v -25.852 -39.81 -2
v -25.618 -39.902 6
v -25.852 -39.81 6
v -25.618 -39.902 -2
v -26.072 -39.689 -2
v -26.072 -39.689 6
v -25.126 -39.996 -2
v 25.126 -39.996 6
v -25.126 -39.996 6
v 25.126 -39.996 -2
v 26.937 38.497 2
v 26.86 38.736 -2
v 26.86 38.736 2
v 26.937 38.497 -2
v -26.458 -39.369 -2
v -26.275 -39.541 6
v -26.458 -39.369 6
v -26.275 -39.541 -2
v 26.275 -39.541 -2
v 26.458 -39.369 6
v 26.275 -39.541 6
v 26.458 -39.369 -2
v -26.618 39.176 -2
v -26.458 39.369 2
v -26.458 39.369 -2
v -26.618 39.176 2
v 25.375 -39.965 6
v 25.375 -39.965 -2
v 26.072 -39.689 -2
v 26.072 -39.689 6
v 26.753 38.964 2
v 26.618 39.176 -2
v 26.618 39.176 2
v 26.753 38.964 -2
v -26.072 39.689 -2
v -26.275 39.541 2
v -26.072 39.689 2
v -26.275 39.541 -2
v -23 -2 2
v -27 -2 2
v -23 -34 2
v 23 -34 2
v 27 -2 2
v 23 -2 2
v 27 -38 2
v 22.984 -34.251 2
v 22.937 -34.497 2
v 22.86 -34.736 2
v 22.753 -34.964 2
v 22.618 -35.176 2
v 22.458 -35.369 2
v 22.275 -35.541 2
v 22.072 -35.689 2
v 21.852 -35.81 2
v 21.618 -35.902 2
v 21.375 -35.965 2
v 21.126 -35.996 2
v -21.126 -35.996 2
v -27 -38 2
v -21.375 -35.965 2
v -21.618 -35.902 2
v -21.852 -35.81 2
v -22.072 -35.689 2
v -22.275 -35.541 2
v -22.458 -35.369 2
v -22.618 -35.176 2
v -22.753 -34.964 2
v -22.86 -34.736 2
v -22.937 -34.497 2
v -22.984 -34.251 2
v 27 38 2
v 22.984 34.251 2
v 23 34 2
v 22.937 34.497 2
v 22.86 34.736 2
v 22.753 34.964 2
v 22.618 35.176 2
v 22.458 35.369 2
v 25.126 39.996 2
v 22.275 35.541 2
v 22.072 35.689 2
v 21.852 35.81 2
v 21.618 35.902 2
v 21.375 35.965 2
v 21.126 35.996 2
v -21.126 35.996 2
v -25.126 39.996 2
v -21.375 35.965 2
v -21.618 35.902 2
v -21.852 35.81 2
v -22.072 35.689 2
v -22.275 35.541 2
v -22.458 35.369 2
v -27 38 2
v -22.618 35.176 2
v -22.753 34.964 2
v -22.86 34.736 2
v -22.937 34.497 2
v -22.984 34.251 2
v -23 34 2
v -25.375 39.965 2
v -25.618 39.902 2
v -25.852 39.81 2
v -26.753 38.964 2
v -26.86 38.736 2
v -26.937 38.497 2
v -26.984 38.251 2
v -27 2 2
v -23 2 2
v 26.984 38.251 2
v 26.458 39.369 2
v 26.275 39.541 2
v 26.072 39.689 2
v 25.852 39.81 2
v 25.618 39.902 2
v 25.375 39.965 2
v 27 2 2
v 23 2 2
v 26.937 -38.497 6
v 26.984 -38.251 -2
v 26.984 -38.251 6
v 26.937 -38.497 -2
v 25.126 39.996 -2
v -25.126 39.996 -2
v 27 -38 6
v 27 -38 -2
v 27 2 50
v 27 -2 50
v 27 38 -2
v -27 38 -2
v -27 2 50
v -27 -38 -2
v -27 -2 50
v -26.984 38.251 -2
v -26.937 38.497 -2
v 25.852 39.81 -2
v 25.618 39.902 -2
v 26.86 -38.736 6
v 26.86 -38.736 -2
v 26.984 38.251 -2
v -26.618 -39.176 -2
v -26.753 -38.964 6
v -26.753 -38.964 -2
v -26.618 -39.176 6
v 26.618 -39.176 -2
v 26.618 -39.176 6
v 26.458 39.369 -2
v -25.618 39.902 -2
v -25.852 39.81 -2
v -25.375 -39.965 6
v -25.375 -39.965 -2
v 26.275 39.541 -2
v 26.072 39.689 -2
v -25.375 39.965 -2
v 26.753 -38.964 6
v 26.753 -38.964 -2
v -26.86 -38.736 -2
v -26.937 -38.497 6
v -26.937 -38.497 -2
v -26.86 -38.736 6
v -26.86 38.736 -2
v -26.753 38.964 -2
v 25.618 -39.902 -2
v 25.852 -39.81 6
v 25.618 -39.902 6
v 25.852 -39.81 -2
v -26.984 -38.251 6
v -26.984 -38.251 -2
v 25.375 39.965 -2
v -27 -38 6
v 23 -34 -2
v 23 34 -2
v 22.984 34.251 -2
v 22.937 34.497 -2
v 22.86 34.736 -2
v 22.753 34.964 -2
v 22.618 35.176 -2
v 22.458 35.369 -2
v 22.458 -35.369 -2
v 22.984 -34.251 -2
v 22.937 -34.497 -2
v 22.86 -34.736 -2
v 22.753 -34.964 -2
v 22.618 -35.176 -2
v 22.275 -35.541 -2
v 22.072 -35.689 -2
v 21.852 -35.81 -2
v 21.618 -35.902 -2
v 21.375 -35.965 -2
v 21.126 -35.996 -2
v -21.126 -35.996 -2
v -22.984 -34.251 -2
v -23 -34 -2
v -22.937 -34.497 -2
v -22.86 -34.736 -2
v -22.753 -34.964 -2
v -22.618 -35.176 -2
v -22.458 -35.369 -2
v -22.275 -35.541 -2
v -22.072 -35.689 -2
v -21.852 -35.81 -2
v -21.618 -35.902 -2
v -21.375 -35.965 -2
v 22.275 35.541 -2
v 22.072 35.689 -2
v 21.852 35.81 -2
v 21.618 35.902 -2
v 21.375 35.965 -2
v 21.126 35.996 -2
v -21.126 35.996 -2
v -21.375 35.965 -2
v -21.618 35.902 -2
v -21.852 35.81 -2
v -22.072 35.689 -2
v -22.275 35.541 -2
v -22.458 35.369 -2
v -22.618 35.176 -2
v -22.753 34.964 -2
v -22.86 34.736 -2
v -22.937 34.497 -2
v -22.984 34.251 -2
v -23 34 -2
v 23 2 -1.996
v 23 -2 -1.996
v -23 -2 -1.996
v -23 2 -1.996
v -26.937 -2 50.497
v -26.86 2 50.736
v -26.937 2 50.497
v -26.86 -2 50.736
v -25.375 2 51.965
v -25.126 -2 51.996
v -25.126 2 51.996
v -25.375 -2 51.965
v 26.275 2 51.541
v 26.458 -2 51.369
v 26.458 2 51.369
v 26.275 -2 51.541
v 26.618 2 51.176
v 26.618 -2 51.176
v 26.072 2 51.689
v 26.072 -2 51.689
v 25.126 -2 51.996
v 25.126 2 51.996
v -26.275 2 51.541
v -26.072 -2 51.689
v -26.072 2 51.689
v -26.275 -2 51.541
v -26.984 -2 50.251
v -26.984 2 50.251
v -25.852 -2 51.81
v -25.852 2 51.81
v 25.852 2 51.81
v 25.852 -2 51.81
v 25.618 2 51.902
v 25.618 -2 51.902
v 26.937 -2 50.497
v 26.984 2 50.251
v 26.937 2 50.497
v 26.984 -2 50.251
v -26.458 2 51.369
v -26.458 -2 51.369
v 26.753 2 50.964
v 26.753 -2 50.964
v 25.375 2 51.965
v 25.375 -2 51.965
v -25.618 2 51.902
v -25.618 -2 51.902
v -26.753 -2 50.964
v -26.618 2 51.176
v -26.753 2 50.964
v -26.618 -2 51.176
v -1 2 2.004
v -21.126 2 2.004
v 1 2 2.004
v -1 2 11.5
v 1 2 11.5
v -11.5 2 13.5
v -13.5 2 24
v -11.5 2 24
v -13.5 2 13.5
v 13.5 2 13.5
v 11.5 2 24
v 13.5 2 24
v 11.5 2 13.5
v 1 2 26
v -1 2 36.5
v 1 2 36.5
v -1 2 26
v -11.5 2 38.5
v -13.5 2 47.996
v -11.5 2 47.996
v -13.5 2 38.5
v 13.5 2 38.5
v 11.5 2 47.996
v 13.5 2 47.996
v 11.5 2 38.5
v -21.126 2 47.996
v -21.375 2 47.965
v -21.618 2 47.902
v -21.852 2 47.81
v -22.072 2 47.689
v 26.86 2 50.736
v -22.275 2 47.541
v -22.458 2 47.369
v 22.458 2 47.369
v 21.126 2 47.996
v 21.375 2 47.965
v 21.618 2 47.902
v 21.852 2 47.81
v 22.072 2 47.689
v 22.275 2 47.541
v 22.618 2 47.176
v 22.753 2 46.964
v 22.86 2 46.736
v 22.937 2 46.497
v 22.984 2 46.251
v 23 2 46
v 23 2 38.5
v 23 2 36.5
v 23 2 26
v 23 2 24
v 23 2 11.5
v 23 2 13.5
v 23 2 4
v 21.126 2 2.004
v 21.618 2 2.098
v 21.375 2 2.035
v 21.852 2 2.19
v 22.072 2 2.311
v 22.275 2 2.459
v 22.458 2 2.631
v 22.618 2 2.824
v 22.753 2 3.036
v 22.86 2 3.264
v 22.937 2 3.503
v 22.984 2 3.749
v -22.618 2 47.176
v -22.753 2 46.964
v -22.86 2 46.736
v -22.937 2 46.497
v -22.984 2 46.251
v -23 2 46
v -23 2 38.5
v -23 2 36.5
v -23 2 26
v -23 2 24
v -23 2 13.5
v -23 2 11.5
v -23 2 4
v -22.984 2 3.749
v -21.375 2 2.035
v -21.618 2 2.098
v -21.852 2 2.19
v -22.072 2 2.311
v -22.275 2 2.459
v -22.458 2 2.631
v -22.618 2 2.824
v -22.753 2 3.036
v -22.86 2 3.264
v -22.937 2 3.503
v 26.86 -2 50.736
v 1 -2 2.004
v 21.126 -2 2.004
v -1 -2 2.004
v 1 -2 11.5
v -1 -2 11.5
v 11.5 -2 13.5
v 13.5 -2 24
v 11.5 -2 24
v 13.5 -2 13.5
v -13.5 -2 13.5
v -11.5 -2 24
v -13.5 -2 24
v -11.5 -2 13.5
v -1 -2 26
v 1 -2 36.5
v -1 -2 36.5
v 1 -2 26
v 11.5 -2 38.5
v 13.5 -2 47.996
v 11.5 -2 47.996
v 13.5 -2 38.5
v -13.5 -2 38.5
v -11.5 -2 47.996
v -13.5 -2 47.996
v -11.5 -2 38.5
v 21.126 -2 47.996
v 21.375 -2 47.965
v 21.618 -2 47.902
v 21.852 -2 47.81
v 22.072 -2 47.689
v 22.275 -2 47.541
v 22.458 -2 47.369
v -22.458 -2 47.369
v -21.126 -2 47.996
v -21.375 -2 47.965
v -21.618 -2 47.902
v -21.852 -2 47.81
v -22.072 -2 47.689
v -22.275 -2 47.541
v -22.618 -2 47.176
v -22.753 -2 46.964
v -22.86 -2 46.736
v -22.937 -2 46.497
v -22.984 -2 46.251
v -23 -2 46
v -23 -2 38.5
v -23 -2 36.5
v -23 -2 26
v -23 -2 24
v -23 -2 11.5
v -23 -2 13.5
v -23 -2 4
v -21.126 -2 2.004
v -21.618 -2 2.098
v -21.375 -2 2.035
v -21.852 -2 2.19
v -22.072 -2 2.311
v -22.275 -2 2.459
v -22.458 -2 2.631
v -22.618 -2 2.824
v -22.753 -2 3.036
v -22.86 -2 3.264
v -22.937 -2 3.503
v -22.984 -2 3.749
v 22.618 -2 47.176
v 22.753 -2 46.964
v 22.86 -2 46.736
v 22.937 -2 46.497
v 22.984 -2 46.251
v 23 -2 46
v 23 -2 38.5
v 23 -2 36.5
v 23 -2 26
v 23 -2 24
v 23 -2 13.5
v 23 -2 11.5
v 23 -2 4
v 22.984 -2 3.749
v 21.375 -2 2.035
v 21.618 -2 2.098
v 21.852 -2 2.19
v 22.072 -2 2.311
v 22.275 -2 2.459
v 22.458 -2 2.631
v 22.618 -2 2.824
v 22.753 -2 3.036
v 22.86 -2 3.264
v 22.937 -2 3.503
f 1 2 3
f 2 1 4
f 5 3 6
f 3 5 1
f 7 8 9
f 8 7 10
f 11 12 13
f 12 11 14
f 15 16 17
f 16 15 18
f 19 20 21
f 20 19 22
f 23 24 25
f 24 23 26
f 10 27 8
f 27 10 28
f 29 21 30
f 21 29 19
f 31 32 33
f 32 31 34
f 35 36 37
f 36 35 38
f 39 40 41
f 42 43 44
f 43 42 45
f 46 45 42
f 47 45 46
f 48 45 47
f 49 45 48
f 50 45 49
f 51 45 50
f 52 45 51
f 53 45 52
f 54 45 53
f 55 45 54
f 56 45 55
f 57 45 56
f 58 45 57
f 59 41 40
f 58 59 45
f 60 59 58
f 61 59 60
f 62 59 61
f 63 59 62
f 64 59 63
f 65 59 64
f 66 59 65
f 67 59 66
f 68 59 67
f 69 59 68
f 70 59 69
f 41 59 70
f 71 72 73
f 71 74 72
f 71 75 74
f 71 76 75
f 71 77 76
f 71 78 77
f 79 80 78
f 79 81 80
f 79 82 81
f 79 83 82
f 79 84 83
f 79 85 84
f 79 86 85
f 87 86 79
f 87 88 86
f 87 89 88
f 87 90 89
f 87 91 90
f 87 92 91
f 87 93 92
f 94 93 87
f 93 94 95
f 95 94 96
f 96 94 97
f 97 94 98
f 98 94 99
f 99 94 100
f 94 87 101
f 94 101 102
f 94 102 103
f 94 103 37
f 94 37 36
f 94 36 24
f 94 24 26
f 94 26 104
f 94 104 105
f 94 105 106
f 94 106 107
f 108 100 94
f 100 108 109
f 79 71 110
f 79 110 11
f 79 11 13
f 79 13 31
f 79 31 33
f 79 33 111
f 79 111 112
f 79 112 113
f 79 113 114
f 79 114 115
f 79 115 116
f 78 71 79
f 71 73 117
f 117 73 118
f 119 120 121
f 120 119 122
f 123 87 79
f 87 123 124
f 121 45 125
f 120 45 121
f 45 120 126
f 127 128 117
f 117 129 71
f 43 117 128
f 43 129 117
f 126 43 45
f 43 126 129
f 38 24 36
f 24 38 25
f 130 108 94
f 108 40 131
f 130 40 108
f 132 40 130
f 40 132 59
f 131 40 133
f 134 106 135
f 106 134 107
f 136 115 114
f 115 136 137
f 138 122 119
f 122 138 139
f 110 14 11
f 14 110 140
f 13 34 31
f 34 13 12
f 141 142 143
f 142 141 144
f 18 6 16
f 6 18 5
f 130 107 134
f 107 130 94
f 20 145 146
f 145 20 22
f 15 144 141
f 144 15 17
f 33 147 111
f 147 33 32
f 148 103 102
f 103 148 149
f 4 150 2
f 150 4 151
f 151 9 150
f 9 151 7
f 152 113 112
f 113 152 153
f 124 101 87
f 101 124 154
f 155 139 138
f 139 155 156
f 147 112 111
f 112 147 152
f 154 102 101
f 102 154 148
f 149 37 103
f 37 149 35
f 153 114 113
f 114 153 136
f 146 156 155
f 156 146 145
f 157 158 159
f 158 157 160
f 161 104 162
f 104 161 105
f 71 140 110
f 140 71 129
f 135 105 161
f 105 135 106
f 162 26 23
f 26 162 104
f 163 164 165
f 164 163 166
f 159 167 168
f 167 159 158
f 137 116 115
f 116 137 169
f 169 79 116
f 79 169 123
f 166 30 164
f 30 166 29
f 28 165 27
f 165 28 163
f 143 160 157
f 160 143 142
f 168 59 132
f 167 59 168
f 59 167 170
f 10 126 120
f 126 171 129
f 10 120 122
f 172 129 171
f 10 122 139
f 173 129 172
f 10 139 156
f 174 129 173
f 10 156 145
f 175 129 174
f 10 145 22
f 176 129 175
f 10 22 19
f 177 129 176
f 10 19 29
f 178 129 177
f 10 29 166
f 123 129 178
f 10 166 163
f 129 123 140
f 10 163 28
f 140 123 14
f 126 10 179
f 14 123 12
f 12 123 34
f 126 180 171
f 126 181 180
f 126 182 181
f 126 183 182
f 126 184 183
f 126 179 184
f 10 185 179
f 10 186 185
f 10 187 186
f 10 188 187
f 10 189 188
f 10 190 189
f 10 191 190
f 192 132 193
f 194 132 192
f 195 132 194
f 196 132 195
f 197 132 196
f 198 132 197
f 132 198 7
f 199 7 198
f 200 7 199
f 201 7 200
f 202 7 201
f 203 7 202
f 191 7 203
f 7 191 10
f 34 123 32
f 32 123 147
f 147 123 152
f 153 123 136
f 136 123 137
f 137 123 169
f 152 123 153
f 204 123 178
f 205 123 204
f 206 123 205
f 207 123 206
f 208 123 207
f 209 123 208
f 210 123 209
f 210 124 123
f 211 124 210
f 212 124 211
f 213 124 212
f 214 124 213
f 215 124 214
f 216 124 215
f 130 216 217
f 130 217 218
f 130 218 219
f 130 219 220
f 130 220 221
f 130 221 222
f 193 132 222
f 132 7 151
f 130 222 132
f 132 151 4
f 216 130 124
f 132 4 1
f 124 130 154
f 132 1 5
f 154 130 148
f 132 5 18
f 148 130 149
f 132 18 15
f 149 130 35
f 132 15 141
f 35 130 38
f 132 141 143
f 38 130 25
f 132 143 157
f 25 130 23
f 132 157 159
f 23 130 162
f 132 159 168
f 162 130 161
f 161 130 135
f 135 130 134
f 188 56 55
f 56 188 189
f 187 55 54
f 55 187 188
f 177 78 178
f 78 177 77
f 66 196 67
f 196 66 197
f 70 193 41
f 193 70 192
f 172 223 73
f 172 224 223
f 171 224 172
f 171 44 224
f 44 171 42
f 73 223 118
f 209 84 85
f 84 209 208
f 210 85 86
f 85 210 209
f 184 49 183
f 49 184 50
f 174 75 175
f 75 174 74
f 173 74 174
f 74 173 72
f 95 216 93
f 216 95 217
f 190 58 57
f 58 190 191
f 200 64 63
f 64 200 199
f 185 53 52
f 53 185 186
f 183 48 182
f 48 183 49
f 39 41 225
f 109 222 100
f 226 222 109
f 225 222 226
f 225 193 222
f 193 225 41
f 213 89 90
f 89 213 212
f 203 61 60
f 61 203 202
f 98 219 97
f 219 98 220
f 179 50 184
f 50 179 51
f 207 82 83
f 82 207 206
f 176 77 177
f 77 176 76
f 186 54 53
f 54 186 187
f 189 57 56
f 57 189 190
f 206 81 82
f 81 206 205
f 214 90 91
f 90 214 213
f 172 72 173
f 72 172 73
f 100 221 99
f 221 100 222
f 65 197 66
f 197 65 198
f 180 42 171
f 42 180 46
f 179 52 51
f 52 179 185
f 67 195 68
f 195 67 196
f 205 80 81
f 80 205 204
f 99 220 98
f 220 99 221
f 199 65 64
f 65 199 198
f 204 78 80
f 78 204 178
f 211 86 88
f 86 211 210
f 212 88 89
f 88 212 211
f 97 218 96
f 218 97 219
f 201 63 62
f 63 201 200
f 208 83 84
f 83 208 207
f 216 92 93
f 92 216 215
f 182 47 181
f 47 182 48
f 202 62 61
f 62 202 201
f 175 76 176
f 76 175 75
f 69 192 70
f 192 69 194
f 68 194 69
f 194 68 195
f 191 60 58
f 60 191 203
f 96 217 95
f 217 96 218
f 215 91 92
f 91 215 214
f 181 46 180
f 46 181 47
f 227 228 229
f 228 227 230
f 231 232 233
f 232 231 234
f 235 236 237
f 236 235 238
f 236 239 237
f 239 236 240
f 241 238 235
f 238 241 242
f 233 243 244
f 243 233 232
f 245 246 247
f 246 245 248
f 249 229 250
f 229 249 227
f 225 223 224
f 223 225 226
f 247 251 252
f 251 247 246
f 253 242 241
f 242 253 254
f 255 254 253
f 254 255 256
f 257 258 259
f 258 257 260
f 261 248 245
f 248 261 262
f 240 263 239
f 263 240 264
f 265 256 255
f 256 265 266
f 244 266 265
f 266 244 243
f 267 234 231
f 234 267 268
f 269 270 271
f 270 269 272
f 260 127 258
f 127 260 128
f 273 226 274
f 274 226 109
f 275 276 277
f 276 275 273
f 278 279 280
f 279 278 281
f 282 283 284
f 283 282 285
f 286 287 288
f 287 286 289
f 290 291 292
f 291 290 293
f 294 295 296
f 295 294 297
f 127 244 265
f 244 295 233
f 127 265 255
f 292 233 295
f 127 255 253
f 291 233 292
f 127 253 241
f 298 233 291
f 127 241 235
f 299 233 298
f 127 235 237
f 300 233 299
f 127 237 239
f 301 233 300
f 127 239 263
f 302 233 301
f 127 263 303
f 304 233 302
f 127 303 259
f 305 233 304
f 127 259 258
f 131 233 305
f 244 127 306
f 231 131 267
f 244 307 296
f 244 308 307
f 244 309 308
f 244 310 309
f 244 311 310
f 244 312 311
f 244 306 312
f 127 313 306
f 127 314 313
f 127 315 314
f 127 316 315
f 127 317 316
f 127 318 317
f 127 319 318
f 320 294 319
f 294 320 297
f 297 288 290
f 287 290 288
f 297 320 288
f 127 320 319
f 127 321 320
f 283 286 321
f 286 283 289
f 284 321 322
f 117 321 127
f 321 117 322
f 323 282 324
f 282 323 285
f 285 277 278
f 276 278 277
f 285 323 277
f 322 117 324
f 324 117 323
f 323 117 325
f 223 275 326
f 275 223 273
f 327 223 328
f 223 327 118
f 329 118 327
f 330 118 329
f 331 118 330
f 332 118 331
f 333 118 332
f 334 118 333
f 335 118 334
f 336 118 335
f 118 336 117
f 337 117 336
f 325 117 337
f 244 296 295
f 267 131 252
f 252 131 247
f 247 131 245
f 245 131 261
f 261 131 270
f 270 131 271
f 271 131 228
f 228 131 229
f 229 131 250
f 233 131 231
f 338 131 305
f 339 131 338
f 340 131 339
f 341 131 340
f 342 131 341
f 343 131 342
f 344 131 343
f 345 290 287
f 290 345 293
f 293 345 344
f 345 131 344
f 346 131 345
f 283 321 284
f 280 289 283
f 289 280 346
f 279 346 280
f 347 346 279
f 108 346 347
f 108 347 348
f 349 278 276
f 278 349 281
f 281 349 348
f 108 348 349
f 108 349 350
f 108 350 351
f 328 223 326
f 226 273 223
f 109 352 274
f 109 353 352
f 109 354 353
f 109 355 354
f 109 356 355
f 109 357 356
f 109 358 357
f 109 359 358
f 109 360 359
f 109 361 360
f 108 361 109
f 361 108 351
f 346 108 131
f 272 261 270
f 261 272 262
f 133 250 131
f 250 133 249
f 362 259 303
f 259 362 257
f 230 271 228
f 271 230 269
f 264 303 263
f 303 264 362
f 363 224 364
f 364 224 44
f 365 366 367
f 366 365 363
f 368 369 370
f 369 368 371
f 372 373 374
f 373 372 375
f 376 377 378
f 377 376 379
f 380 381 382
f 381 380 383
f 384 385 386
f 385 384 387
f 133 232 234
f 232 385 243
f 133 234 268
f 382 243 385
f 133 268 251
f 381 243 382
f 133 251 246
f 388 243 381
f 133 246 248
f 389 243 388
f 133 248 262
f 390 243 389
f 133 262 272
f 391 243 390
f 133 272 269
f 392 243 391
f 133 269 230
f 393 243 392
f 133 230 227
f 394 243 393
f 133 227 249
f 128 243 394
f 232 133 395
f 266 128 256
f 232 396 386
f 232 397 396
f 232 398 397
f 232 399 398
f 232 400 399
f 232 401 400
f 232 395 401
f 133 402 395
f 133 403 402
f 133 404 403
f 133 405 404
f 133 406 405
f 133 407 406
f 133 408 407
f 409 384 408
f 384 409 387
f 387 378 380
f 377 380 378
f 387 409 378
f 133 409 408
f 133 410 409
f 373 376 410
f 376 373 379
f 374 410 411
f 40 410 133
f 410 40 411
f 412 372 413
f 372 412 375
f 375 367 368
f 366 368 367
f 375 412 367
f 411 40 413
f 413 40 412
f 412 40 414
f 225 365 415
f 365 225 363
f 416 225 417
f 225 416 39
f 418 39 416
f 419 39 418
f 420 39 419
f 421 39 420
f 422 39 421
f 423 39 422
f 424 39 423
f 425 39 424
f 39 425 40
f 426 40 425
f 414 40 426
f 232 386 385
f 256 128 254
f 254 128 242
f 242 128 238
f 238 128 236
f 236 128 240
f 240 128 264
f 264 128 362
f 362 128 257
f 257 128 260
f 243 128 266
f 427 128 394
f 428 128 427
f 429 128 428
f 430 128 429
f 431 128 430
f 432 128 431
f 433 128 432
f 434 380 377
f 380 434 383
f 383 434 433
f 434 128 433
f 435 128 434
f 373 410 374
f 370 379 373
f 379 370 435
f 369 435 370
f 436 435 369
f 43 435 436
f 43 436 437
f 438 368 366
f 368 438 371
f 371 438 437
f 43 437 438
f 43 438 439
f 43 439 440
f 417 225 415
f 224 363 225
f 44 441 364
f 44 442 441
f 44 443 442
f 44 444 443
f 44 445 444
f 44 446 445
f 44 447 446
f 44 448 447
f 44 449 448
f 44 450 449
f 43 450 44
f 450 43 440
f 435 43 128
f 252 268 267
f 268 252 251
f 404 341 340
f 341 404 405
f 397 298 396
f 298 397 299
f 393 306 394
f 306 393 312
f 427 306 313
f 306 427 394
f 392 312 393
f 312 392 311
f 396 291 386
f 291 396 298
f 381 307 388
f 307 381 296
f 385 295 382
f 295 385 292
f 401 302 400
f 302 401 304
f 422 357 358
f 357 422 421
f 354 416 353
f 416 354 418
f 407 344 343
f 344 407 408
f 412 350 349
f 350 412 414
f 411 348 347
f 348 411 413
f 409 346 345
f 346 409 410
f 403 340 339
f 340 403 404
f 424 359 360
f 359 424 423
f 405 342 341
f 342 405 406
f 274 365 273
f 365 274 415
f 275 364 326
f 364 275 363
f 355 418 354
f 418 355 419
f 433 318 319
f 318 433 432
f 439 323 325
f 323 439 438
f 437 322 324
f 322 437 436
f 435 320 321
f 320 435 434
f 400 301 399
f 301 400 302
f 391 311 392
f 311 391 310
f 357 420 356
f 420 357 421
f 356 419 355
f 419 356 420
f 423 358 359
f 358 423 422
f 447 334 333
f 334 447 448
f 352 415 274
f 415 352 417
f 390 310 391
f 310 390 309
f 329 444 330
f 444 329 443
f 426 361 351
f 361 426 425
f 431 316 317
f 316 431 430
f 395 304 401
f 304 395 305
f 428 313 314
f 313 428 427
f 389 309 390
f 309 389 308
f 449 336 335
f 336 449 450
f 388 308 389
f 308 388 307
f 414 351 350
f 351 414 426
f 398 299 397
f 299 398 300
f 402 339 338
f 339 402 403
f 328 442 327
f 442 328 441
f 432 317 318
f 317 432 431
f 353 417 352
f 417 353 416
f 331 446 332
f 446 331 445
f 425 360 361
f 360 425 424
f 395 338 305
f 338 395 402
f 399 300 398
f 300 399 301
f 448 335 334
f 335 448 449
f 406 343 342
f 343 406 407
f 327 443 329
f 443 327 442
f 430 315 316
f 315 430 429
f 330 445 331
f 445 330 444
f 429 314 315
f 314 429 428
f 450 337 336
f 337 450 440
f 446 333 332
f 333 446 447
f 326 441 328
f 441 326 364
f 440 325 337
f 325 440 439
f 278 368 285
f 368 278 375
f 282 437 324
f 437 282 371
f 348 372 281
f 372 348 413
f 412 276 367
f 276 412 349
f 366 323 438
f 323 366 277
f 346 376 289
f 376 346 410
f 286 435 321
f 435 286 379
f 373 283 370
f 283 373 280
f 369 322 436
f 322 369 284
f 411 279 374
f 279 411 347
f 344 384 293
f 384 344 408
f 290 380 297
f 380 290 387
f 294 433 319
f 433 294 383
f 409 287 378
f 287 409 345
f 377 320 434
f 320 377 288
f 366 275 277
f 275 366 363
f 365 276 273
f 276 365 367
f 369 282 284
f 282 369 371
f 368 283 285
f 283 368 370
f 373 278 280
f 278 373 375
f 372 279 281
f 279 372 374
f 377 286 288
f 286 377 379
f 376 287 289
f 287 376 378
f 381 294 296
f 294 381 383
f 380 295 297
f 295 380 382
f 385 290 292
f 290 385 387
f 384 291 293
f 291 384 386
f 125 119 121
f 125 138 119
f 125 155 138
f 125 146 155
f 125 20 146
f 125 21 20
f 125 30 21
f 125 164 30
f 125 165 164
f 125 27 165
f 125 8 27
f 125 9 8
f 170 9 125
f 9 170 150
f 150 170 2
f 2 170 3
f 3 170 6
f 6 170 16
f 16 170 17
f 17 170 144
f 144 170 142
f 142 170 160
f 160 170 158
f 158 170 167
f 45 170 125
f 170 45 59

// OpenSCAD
// Simple phone stand

l = 50;
w = 76; // l x w will be the size of the base
h = 50;  
th = 4; // thickness of the bouding pillars
eb = true; // extend base to back to prevent tip over. Not required if phone is placed only on the side (watch videos etc.) on the stand

// base of the stand
module base()
{
    difference()
    {
       
        roundedCornerCube(l,w,th);
        roundedCornerCube(l-(th*2),w-(th*2),th);
    }

}

// vertical back of the stand
module backside()
{

    translate([0,0,50/2])
    rotate ([90,0,0])
        difference()
        {
        roundedCornerCube(50,50,4);
        roundedCornerCube(50 - 8,50 - 8,4);
        }

        // horizontal rows
        translate([0,0,50/4]) cube ([50,4,2], center=true);   
        translate([0,0,(50/4 + 50/4)]) cube ([50,4,2], center=true);   
        translate([0,0,(50/4 + (50/4 * 2))]) cube ([50,4,2], center=true);   

        // vertical supports
        translate([0,0,(50/4)/2]) rotate([0,90,0]) cube ([50/4,4,2], center=true);
        
        translate([50/4,0,(50/4 + 50/4) - (50/4)/2]) rotate([0,90,0]) cube ([50/4,4,2], center=true);
        translate([-50/4,0,(50/4 + 50/4) - (50/4)/2]) rotate([0,90,0]) cube ([50/4,4,2], center=true);

        translate([0,0,(50/4 + (50/4 * 2)) - (50/4)/2]) rotate([0,90,0]) cube ([50/4,4,2], center=true);

        translate([50/4,0,(50/4 + (50/4 * 2)) + (50/4)/2]) rotate([0,90,0]) cube ([50/4,4,2], center=true);
        translate([-50/4,0,(50/4 + (50/4 * 2)) + (50/4)/2]) rotate([0,90,0]) cube ([50/4,4,2], center=true);

}  


//end stop
module endstop()
{
    difference()
    {
        hull()
        {
            translate([l/2,-w/2,th]) cylinder(r=2, h=4, $fn=50, center=true);
            translate([-l/2,-w/2,th]) cylinder(r=2, h=4, $fn=50, center=true);
        }
        
        translate([0,-w/2 + 1,th]) cube([l+th,th/2,th], center=true);
    }
}

module extendbase()
{
    if (eb)
    {
    translate([0,-w + th,0]) base();
    }
}

module roundedCornerCube(length, width, thickness){

            hull()
        {
            translate([length/2, width/2, 0]) cylinder(r=2, h=thickness, $fn=50, center=true);
            translate([length/2, -width/2, 0]) cylinder(r=2, h=thickness, $fn=50, center=true);
            translate([-length/2, width/2, 0]) cylinder(r=2, h=thickness, $fn=50, center=true);
            translate([-length/2, -width/2, 0]) cylinder(r=2, h=thickness, $fn=50, center=true);
        }

 }
    
base();
backside();
endstop();
